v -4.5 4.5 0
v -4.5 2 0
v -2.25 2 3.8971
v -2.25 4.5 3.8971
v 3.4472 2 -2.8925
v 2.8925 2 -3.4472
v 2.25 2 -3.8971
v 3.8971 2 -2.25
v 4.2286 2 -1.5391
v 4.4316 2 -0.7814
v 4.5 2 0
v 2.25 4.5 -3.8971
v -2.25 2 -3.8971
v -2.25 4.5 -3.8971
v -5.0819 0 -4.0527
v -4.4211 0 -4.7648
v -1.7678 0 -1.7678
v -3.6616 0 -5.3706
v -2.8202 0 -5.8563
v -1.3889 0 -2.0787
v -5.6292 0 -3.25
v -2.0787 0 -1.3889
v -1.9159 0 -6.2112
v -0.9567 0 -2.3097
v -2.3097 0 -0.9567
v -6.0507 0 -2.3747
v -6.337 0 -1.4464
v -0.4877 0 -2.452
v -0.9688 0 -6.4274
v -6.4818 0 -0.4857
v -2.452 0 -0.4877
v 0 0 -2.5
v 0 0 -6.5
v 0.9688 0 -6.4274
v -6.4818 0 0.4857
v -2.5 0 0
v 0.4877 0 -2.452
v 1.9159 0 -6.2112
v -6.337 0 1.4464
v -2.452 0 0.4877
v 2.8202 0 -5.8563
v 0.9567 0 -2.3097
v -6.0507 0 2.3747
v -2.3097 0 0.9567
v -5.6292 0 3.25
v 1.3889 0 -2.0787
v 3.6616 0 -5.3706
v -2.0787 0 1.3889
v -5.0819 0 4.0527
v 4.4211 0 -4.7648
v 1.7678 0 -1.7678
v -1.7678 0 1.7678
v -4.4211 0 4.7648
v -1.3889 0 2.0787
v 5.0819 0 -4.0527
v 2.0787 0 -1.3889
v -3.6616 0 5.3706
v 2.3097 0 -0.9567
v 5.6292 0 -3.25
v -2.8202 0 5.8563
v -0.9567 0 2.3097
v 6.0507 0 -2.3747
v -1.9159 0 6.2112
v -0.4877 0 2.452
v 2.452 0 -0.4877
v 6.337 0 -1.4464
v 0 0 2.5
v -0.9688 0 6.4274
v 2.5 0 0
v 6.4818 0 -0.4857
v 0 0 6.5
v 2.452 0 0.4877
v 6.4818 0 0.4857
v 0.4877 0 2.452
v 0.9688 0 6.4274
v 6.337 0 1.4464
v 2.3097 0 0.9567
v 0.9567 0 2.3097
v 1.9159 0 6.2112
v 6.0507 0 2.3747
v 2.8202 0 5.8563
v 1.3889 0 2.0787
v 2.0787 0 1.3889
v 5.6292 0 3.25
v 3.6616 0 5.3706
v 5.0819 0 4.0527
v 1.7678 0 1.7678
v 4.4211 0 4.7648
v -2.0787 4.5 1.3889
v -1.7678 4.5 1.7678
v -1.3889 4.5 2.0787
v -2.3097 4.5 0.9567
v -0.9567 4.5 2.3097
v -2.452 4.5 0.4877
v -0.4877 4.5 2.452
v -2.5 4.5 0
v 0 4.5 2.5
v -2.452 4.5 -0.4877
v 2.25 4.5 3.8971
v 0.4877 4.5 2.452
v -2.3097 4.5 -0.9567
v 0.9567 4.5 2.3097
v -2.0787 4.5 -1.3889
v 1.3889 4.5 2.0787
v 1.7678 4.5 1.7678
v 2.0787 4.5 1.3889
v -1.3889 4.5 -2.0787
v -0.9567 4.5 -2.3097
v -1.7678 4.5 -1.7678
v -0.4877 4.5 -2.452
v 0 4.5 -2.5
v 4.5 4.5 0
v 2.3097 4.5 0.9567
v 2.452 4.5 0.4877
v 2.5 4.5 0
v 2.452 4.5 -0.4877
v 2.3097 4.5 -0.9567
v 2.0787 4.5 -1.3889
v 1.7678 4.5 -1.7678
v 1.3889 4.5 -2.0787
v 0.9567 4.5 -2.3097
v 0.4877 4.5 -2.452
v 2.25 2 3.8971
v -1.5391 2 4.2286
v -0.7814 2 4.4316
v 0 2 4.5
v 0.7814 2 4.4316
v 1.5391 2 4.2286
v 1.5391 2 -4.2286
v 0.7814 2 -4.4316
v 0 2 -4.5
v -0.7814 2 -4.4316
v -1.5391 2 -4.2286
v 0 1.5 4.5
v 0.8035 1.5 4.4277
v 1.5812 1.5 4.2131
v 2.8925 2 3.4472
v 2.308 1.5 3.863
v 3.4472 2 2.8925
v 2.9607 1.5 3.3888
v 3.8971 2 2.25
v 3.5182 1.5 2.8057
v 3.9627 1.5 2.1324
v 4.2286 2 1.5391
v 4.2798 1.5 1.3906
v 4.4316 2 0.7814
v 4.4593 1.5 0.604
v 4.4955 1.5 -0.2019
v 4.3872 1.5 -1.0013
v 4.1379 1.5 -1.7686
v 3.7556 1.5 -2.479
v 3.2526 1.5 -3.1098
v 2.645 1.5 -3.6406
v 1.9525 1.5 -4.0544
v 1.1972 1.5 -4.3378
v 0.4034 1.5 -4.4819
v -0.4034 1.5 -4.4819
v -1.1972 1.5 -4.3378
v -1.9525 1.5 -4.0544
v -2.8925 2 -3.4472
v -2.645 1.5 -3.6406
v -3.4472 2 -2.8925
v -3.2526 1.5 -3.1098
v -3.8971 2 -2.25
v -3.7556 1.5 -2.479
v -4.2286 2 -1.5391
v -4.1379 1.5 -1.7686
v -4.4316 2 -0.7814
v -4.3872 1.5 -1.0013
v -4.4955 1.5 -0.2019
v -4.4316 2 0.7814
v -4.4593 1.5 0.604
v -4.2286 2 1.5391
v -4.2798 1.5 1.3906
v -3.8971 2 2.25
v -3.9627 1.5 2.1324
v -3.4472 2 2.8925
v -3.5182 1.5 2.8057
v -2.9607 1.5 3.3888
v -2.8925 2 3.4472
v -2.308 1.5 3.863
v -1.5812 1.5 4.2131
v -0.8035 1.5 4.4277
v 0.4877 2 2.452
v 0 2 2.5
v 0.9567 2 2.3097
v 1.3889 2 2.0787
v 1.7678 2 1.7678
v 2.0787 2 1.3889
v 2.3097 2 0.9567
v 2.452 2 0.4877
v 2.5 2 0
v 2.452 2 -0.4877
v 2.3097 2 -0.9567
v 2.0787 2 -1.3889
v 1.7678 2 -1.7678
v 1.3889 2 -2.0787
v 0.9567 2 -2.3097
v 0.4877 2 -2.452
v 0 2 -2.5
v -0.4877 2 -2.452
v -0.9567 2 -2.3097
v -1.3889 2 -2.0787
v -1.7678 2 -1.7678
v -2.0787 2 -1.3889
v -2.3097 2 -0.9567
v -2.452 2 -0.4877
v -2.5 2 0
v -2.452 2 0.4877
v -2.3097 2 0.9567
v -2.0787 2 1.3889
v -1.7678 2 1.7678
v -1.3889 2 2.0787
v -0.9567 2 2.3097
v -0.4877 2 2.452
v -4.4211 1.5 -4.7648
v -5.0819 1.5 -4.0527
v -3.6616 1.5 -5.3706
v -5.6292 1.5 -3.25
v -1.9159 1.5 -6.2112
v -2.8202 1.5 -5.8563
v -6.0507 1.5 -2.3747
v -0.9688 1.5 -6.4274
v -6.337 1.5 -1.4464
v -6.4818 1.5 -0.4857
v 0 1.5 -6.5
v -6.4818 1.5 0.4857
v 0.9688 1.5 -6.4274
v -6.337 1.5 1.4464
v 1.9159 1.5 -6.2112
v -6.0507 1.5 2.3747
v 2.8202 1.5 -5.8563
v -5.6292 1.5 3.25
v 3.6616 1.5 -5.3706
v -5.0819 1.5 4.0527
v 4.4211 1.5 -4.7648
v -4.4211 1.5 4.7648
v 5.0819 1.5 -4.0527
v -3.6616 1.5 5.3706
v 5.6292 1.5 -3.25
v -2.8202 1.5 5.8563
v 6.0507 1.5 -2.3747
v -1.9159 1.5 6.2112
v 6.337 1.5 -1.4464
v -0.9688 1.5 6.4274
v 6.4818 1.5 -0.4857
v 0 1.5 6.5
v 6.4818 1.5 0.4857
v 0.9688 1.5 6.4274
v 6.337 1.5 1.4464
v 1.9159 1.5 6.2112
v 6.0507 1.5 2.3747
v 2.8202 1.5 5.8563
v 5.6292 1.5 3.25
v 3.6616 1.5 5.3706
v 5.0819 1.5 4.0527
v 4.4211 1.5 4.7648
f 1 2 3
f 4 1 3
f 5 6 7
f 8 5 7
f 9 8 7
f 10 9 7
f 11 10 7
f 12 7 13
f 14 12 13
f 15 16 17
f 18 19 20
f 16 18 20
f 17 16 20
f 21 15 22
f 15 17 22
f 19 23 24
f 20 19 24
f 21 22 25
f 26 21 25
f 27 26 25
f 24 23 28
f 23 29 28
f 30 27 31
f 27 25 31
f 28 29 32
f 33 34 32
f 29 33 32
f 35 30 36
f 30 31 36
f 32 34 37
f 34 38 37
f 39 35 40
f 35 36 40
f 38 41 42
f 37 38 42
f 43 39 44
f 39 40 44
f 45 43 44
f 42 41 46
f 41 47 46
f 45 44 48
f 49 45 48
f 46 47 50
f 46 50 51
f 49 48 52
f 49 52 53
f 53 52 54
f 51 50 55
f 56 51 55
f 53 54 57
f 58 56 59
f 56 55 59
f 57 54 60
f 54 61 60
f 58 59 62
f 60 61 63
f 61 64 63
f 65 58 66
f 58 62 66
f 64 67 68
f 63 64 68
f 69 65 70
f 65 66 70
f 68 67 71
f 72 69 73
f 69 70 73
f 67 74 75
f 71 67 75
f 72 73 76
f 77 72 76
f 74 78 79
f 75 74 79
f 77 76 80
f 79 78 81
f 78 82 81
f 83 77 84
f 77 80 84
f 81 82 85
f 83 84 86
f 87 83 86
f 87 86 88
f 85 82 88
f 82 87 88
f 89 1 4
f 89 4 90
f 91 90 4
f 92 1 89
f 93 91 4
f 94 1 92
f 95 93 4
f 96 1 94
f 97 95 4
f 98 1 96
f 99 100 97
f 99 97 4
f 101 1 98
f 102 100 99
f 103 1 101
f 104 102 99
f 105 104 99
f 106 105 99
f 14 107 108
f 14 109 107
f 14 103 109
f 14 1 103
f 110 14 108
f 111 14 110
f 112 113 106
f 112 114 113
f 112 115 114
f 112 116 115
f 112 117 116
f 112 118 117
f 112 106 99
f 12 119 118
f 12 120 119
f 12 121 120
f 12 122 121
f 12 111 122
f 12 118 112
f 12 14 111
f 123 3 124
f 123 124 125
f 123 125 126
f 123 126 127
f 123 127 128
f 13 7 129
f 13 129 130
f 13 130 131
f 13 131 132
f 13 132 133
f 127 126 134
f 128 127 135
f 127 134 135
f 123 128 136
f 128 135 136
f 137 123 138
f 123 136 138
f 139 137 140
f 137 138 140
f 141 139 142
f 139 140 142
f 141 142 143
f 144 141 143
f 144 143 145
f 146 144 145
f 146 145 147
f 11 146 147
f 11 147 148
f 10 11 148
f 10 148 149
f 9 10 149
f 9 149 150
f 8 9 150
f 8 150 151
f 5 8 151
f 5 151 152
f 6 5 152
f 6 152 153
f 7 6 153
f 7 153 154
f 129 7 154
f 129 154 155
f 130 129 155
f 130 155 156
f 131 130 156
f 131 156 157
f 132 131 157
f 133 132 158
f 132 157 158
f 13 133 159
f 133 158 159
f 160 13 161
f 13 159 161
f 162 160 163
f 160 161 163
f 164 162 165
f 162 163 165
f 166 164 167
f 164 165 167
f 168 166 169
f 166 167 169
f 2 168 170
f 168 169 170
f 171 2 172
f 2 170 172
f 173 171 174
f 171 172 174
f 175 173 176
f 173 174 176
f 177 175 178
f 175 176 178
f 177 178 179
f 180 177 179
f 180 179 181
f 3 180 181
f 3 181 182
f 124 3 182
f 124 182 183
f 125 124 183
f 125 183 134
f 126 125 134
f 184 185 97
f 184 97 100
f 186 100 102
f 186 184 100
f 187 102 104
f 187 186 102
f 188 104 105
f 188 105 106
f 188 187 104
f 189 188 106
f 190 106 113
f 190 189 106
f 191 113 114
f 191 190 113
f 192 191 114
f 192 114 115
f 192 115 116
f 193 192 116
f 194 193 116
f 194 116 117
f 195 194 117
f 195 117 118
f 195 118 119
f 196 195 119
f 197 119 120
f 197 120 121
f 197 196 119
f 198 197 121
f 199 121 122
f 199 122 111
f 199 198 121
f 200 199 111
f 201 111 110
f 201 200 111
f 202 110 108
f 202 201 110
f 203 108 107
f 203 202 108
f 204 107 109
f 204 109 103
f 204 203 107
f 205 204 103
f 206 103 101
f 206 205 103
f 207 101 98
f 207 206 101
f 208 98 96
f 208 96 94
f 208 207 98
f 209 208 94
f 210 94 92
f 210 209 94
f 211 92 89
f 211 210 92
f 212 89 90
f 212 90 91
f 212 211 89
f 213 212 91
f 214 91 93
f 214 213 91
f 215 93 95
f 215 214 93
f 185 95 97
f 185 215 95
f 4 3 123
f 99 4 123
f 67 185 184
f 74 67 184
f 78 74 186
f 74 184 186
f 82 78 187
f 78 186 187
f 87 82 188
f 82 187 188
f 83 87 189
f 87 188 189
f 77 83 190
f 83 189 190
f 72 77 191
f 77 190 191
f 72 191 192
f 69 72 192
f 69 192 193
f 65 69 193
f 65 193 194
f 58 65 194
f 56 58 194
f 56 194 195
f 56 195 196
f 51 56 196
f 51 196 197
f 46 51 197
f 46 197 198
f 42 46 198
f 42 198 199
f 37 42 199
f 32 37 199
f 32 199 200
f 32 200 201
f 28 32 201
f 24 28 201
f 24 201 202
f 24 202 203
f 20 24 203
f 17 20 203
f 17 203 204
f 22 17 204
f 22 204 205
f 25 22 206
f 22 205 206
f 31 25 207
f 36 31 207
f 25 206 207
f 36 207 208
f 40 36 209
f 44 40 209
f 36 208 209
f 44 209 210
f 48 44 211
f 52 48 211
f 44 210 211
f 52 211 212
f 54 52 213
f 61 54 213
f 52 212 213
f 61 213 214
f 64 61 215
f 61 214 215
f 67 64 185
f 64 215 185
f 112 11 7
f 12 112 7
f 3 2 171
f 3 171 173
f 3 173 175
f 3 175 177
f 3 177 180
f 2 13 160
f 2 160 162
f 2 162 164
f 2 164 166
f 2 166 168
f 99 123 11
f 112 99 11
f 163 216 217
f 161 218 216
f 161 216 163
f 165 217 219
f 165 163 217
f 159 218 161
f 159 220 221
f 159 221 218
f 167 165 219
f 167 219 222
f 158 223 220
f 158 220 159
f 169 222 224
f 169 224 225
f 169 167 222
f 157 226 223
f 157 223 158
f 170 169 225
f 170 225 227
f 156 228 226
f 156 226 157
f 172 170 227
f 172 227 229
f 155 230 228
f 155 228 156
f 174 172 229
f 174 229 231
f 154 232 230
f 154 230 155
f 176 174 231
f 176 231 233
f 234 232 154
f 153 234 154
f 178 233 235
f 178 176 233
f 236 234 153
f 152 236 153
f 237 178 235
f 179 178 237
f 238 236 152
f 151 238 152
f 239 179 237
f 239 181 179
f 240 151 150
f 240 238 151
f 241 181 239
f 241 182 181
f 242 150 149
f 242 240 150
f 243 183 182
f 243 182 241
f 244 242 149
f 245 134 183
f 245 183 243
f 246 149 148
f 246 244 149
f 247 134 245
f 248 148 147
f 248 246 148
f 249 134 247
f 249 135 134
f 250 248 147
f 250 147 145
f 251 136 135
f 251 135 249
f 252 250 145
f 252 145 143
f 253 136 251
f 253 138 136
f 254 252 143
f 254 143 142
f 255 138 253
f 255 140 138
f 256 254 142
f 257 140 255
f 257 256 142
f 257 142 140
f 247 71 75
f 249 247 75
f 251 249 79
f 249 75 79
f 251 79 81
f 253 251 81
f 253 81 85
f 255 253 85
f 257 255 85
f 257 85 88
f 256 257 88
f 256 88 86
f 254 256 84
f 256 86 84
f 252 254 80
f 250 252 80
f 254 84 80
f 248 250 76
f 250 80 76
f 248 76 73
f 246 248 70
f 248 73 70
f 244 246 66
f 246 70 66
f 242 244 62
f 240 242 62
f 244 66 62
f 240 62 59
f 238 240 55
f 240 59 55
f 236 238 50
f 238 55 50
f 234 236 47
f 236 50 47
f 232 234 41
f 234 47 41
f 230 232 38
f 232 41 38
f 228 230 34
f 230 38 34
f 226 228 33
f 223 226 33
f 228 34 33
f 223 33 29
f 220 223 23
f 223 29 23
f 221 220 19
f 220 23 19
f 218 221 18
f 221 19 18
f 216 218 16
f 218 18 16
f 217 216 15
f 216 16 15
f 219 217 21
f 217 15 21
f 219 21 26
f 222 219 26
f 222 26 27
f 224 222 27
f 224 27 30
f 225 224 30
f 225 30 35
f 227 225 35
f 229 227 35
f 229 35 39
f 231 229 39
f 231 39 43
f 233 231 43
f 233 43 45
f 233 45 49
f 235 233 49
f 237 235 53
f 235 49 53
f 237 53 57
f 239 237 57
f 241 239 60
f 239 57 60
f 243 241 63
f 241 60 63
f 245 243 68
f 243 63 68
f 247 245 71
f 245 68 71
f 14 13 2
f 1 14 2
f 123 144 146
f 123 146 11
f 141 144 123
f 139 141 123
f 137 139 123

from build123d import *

# Parameters (mm, degrees)
SKETCH1_R           = 6.5
BOSS_EXTRUDE1_DEPTH = 1.5
SKETCH2_R           = 4.5
BOSS_EXTRUDE2_DEPTH = 0.5
SKETCH3_R           = 2.5
BOSS_EXTRUDE3_DEPTH = 2.5
SKETCH4_R           = 2.5
CUT_EXTRUDE1_DEPTH  = 3.5


with BuildPart() as part:
    # Sketch1 → Boss-Extrude1 (new body)
    with BuildSketch(Plane(origin=(0, 0, 0), x_dir=(1, 0, 0), z_dir=(0, 1, 0))):
        with Locations(Location((0, 0, 0), (0, 0, 270))):  # turned: the seam where the file's is
            Circle(SKETCH1_R)
    extrude(amount=BOSS_EXTRUDE1_DEPTH)

    # Sketch2 → Boss-Extrude2 (add)
    with BuildSketch(Plane(origin=(0, 1.5, 0), x_dir=(1, 0, 0), z_dir=(0, 1, 0))):
        with Locations(Location((0, 0, 0), (0, 0, 270))):  # turned: the seam where the file's is
            Circle(SKETCH2_R)
    extrude(amount=BOSS_EXTRUDE2_DEPTH)

    # Sketch3 → Boss-Extrude3 (add)
    with BuildSketch(Plane(origin=(0, 2, 0), x_dir=(1, 0, 0), z_dir=(0, 1, 0))):
        Polygon((-4.5, 0), (-2.25, -3.897114317), (2.25, -3.897114317), (4.5, 0), (2.25, 3.897114317), (-2.25, 3.897114317), align=None)
        with Locations(Location((0, 0, 0), (0, 0, 270))):  # turned: the seam where the file's is
            Circle(SKETCH3_R, mode=Mode.SUBTRACT)
    extrude(amount=BOSS_EXTRUDE3_DEPTH)

    # Sketch4 → Cut-Extrude1 (cut)
    with BuildSketch(Plane(origin=(0, 2, 0), x_dir=(1, 0, 0), z_dir=(0, 1, 0))):
        with Locations(Location((0, 0, 0), (0, 0, 270))):  # turned: the seam where the file's is
            Circle(SKETCH4_R)
    extrude(amount=-CUT_EXTRUDE1_DEPTH, mode=Mode.SUBTRACT)


solid = part.part
